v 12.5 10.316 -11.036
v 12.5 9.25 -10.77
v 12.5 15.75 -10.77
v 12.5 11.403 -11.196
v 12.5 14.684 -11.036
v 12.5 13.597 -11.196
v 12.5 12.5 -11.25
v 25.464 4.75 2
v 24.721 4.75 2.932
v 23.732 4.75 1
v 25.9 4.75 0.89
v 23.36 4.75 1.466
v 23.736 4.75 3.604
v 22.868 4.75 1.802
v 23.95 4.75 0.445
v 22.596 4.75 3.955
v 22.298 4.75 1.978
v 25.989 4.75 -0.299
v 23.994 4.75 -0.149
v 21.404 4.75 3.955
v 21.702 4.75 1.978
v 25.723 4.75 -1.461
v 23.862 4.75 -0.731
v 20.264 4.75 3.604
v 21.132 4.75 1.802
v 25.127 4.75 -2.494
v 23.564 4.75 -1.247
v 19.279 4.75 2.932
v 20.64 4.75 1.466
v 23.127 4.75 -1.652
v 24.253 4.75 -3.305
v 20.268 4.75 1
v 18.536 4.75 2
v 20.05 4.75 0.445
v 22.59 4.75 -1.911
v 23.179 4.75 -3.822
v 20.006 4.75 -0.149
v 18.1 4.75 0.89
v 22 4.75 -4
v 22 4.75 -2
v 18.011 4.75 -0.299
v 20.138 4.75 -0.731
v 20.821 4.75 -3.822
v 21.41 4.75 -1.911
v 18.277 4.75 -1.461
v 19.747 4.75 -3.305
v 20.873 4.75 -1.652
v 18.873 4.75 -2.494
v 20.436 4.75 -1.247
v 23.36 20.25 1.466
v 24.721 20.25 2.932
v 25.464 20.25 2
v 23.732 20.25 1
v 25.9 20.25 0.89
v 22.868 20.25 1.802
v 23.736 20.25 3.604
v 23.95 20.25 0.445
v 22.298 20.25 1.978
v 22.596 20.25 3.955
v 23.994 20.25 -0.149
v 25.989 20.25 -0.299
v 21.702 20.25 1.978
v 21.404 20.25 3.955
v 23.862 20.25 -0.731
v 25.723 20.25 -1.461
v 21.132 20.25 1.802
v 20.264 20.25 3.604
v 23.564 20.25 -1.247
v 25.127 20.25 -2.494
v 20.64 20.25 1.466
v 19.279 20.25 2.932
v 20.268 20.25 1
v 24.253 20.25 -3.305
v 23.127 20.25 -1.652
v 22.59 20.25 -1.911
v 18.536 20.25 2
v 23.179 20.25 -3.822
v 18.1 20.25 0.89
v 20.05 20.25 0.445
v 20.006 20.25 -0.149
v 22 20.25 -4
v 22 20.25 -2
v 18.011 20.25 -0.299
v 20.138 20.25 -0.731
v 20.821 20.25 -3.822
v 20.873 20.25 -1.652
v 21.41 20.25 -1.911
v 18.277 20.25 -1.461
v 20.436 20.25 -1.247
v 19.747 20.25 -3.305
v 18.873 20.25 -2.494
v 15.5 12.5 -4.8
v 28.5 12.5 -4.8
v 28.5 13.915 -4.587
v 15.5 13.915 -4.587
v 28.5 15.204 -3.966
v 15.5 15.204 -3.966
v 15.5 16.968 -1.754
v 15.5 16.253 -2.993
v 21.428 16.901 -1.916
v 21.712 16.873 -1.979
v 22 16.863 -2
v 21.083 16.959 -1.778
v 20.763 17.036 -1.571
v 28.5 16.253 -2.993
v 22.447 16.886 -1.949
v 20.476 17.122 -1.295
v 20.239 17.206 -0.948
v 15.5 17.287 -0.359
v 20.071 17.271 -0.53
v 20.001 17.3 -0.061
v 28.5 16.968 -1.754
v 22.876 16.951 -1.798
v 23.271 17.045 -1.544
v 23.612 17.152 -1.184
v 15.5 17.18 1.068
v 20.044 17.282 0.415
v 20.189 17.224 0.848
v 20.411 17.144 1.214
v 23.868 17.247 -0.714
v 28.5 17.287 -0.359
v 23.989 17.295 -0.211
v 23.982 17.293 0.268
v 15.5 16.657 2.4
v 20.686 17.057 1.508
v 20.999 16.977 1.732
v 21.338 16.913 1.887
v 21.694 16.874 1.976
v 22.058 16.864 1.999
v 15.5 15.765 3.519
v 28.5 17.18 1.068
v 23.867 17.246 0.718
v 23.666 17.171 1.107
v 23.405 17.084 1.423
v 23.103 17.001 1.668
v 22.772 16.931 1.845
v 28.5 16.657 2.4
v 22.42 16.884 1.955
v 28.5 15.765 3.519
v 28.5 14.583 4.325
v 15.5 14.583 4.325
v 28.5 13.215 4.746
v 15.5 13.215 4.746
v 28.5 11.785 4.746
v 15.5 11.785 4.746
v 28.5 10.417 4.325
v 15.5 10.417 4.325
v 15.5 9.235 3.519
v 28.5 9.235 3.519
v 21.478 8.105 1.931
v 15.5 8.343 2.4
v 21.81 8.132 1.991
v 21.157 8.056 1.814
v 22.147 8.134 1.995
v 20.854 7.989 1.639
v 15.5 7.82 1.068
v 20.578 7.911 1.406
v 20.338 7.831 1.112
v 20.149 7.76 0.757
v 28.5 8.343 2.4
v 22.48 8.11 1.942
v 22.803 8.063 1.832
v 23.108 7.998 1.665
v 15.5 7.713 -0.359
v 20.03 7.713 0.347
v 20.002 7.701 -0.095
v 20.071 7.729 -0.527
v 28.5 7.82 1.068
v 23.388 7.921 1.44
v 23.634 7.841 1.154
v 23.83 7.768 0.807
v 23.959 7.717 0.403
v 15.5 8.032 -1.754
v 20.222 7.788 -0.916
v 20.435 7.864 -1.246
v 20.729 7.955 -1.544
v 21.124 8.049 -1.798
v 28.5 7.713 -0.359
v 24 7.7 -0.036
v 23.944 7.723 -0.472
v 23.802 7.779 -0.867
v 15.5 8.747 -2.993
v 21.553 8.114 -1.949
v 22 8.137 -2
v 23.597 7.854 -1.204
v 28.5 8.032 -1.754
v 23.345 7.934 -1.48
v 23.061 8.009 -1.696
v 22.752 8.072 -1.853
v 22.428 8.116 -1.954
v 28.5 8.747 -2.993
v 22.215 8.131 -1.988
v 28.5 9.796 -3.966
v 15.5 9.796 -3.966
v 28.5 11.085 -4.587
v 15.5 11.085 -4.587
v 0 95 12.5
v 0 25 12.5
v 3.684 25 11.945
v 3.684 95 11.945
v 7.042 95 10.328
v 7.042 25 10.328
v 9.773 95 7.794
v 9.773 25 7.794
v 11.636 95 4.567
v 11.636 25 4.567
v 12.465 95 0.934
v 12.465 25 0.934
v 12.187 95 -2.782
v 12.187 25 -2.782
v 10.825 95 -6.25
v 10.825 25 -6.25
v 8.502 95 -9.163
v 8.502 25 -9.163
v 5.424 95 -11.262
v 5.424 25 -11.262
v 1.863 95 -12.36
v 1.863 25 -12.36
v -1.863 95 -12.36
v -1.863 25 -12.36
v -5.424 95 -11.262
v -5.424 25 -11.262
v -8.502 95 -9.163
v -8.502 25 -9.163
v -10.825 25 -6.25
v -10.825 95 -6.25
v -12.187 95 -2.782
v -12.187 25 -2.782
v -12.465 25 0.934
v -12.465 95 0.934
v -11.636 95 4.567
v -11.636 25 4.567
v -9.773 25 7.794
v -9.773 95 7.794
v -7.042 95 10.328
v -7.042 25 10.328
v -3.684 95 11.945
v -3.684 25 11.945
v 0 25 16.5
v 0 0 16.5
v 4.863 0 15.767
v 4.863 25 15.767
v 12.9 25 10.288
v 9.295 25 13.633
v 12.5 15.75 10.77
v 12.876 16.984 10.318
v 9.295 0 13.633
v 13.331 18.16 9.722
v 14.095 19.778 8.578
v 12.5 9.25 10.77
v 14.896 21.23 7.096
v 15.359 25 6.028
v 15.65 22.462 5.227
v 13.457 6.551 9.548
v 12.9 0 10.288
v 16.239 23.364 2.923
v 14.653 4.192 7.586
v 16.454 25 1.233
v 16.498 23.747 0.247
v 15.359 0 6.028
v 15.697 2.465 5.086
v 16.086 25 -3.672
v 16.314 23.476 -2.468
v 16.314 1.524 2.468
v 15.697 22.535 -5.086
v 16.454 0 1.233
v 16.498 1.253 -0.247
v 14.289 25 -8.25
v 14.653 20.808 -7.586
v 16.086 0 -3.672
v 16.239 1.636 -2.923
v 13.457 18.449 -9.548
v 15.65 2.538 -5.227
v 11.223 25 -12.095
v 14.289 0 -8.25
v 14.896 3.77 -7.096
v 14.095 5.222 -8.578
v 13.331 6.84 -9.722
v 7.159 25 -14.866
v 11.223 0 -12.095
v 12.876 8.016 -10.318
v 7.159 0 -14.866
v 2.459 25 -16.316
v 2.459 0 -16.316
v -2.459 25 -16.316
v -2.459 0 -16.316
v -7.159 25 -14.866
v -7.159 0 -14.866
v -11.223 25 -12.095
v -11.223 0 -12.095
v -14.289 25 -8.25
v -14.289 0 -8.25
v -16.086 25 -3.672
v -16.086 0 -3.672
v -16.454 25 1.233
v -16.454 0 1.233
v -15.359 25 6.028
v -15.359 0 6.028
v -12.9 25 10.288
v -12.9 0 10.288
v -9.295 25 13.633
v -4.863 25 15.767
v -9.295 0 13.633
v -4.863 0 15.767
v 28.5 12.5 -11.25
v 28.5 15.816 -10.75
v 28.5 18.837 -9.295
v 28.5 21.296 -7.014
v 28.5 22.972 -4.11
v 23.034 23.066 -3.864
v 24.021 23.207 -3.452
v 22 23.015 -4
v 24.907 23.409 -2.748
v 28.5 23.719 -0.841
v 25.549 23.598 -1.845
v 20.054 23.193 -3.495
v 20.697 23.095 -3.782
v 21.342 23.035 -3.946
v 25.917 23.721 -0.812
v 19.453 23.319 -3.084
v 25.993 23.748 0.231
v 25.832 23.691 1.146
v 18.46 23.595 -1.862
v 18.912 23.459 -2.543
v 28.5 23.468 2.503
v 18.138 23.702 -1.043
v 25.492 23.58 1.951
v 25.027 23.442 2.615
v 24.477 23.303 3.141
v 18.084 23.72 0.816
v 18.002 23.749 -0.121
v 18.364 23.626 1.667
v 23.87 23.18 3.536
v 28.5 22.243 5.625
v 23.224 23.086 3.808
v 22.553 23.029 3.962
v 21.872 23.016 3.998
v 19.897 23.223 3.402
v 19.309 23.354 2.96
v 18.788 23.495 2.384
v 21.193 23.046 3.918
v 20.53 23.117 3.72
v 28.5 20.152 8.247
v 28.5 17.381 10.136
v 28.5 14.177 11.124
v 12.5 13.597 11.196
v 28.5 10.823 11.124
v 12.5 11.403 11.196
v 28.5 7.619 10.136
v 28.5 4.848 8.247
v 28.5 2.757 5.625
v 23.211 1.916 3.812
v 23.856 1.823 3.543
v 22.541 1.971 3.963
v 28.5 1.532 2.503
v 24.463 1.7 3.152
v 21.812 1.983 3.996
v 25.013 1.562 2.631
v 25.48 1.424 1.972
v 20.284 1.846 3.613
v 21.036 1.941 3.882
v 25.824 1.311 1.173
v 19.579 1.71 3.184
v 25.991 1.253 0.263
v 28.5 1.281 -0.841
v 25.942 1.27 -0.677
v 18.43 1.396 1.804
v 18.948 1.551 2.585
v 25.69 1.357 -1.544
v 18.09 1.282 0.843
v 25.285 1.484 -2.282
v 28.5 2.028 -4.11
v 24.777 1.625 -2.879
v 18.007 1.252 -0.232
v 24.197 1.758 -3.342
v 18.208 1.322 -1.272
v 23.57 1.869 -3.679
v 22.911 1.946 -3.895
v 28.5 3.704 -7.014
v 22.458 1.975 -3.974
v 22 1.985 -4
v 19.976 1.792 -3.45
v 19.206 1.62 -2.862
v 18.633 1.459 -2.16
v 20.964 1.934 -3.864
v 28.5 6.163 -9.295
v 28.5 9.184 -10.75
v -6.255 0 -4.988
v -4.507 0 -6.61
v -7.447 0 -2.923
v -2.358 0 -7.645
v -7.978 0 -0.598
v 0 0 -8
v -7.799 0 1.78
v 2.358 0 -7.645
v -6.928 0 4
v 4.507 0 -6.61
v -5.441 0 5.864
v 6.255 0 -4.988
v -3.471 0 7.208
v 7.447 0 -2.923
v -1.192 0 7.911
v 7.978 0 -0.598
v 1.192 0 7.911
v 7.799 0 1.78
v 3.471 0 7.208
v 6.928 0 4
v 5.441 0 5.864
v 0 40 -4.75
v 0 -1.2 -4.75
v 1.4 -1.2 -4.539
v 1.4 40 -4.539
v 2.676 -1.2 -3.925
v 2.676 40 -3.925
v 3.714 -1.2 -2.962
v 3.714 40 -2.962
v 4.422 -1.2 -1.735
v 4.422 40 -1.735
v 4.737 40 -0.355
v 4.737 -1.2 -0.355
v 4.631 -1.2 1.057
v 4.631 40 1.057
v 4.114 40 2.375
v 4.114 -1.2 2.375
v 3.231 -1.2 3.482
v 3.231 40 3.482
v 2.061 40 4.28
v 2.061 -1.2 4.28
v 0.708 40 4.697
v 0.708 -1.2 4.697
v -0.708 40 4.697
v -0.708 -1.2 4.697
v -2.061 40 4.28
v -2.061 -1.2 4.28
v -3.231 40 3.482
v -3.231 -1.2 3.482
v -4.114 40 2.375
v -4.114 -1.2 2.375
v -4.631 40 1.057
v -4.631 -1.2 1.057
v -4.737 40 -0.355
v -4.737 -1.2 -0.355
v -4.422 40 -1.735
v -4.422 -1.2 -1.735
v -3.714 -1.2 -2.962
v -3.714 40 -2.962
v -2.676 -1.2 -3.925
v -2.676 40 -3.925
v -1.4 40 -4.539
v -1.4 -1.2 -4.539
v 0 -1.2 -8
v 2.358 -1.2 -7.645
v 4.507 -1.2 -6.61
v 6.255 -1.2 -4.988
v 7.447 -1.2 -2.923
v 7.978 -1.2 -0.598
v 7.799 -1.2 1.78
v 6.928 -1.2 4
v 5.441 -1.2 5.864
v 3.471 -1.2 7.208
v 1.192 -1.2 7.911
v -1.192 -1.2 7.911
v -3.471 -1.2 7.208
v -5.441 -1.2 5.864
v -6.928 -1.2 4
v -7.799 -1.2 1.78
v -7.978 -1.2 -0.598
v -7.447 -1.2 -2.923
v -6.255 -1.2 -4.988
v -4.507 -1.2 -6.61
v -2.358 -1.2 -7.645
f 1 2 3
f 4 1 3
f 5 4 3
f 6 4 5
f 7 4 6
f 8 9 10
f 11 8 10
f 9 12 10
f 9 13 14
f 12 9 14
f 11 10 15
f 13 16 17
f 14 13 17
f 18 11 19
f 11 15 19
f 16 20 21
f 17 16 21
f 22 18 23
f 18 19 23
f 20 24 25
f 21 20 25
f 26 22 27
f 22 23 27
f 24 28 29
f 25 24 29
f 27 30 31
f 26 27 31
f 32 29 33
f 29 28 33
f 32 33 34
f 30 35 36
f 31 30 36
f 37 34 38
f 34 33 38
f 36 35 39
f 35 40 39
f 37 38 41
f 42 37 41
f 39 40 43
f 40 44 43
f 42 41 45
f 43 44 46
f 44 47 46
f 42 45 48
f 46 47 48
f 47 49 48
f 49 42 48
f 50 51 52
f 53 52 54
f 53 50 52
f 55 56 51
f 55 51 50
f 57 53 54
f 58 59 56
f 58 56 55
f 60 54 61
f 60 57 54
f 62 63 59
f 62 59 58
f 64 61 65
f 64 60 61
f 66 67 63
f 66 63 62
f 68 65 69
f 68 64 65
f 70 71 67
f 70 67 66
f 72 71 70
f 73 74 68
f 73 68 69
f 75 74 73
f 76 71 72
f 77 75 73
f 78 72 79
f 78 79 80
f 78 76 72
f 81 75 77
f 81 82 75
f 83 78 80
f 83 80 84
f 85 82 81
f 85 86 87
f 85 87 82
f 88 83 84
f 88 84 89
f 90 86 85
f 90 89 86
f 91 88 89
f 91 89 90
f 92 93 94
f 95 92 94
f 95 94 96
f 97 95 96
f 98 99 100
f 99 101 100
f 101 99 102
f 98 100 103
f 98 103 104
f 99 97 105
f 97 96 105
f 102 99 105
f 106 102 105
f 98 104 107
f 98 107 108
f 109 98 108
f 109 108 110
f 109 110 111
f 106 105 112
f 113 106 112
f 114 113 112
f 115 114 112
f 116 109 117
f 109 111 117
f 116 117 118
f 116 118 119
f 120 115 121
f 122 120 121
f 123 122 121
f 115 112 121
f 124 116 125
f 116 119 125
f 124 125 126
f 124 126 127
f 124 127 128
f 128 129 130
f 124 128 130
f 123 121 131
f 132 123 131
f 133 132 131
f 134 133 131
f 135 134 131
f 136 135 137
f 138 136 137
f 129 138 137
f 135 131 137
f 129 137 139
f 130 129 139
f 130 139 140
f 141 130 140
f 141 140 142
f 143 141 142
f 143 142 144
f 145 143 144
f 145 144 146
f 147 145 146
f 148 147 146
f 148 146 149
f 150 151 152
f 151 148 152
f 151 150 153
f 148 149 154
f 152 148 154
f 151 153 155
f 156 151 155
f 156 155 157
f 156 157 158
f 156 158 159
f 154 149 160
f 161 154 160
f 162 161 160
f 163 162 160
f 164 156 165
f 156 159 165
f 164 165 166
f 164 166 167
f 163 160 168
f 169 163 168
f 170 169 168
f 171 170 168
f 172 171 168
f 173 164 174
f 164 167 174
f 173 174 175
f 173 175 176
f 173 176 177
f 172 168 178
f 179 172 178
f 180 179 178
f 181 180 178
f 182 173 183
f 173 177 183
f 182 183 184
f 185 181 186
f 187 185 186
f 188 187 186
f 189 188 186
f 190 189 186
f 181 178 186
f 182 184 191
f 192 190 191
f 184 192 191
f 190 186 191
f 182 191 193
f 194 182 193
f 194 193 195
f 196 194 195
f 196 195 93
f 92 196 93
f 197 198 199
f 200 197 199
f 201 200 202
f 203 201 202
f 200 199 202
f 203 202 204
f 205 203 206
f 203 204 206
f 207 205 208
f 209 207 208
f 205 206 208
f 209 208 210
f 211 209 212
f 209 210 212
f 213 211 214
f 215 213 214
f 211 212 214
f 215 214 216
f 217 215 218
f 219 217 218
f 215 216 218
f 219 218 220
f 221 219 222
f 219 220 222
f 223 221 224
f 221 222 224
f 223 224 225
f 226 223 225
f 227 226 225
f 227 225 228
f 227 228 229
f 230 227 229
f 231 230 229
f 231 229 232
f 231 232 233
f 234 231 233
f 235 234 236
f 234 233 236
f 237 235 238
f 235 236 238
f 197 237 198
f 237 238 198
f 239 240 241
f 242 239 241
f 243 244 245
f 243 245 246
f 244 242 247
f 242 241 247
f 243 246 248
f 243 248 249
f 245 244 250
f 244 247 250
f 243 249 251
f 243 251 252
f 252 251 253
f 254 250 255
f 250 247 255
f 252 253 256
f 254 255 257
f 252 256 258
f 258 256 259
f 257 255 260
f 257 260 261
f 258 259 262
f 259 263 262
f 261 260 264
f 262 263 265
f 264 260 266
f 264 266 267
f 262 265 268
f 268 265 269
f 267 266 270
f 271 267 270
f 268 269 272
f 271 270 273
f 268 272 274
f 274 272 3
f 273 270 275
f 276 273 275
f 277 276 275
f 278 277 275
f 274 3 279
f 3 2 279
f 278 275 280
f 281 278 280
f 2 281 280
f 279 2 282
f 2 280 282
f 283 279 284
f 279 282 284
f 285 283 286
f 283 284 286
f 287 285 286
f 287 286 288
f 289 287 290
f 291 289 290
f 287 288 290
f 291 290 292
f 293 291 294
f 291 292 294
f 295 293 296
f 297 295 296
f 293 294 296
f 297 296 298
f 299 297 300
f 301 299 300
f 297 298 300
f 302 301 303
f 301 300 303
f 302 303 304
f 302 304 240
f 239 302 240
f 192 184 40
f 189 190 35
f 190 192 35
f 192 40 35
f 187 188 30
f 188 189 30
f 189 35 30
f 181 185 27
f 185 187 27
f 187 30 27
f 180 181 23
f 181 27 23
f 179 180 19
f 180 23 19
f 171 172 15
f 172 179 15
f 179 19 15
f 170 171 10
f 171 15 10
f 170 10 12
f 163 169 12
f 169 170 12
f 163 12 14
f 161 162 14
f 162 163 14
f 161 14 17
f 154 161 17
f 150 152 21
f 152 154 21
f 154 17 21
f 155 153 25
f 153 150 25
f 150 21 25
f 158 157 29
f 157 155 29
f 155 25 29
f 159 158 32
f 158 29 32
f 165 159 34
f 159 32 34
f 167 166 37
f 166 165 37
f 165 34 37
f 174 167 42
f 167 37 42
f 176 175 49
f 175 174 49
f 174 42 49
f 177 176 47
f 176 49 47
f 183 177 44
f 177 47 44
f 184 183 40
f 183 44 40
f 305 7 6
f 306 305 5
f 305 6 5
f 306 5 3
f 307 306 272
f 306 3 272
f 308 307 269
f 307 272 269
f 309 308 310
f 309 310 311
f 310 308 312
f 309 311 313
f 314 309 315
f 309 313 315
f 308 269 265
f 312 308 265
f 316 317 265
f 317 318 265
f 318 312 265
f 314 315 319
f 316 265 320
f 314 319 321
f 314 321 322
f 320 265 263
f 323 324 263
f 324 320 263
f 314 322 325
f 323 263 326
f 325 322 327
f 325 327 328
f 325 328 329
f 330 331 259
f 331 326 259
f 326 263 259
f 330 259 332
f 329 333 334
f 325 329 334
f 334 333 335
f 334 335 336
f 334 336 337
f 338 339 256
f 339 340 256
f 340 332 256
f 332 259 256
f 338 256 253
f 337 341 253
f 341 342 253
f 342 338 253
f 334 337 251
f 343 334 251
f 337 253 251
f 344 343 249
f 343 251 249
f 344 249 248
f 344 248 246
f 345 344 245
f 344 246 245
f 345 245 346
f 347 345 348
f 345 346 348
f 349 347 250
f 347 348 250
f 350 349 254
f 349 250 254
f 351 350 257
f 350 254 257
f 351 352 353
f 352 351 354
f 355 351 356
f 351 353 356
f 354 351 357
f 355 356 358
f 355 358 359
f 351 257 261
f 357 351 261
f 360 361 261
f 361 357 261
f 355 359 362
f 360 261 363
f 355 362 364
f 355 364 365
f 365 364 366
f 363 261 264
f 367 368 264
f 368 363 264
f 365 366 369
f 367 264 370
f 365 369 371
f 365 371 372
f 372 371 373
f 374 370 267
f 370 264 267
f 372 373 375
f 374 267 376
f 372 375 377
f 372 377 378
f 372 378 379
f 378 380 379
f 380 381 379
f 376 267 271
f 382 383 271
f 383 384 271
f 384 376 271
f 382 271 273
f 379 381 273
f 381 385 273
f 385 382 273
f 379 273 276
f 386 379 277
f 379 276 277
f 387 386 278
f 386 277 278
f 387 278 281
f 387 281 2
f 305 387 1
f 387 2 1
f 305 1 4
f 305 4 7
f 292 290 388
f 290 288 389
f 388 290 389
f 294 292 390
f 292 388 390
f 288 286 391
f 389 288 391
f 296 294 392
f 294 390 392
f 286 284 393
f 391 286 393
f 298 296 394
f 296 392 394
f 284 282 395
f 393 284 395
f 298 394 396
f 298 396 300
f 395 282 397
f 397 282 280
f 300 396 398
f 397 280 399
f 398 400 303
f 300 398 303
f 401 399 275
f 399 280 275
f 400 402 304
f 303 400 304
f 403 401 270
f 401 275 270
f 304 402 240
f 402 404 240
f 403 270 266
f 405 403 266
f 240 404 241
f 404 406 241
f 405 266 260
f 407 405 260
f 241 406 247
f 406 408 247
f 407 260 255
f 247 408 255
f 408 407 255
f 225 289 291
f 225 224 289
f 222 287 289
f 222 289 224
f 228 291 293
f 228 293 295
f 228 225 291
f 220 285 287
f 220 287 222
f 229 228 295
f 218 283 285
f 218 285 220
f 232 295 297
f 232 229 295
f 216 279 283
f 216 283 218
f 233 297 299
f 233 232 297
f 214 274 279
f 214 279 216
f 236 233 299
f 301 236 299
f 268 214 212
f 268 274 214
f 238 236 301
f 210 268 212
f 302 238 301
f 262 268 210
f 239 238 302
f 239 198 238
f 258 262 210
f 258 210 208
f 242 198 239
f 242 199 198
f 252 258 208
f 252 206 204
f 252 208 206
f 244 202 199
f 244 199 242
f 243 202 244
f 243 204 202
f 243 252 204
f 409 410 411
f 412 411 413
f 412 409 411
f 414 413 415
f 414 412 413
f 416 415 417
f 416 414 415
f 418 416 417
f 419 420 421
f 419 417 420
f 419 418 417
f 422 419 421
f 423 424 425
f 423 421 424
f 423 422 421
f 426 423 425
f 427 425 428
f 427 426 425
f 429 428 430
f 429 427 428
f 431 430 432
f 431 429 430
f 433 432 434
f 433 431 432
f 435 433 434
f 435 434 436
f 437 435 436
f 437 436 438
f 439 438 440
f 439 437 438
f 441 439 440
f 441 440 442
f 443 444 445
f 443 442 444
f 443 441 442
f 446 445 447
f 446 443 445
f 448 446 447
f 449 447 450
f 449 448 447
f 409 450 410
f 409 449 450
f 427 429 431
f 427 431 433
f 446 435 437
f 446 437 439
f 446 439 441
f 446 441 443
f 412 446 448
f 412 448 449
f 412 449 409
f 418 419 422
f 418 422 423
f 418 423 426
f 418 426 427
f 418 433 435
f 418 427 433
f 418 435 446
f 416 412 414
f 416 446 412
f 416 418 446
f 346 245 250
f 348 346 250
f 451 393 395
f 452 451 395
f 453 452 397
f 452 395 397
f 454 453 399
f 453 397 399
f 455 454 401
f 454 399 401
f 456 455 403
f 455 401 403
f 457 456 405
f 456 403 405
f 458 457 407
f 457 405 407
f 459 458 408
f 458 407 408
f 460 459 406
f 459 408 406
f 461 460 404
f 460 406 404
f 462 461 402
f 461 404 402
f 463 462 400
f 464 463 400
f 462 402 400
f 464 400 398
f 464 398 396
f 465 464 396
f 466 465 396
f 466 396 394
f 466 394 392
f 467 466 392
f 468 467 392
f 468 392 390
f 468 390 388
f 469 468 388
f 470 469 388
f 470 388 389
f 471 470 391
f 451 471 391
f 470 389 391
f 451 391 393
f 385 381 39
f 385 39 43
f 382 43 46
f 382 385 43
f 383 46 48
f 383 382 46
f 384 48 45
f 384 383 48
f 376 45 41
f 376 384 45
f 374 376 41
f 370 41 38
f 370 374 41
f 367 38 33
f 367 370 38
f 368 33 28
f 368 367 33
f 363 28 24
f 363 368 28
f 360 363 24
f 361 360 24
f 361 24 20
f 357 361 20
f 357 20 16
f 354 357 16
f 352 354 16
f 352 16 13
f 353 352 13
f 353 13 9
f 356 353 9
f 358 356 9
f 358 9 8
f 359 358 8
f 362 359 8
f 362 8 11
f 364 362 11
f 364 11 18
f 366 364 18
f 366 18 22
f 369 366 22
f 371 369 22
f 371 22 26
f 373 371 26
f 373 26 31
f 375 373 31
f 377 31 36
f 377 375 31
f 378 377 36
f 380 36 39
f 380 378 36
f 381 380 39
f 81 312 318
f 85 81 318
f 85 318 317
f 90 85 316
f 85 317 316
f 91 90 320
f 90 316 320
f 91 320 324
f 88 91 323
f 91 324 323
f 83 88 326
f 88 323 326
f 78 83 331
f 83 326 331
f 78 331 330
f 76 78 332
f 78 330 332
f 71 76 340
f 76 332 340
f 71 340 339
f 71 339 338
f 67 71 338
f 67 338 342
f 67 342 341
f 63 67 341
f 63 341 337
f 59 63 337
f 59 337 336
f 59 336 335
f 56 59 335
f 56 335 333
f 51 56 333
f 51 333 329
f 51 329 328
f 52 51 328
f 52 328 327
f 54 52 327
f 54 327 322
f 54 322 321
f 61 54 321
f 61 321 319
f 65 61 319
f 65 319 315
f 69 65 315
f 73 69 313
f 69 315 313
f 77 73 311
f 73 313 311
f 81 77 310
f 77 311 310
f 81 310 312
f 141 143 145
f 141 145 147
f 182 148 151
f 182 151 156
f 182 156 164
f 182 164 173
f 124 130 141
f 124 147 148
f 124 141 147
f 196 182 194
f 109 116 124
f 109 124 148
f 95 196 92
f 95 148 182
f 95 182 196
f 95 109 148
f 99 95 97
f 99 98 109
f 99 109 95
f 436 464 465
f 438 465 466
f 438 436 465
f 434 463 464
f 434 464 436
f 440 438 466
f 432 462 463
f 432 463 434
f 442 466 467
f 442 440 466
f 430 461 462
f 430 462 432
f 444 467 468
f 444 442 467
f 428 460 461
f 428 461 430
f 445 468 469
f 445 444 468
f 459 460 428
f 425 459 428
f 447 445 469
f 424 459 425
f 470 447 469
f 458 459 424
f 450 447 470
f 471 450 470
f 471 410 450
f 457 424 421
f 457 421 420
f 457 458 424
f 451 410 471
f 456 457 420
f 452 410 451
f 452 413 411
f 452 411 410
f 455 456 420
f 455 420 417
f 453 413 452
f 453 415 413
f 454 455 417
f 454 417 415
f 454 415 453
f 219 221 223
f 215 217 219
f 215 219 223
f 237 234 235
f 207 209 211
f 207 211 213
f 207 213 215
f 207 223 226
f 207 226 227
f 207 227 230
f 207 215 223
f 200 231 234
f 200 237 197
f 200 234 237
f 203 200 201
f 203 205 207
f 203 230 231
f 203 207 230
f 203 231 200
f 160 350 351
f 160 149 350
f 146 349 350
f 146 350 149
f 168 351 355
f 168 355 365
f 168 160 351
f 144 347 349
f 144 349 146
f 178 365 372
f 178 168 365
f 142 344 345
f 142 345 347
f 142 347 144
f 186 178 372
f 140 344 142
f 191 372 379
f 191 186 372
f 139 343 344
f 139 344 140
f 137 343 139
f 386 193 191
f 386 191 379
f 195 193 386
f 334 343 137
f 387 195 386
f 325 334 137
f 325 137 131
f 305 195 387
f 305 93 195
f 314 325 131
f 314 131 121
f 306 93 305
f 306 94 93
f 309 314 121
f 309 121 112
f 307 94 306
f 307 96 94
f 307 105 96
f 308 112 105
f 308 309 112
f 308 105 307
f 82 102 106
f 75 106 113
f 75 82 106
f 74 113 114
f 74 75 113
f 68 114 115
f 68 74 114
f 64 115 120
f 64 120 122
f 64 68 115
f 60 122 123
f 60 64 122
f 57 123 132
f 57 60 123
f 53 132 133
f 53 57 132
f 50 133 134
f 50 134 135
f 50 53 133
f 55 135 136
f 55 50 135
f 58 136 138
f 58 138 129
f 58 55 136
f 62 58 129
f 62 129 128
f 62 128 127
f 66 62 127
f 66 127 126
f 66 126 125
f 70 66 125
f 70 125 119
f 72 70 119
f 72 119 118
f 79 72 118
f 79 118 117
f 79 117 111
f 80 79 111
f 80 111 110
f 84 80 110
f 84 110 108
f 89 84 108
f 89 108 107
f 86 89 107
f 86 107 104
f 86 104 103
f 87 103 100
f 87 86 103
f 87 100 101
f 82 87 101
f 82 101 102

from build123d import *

# Parameters (mm, degrees)
ESQUISSE1_R                         = 16.5
BOSS_EXTRU_1_DEPTH                  = 25
BOSS_EXTRU_4_DEPTH                  = 12
BOSS_EXTRU_4_DEPTH_BACK             = 4
ESQUISSE9_R                         = 11.25
ESQUISSE10_R                        = 4.8
ENL_V_MAT_EXTRU_3_DEPTH             = 13
ESQUISSE11_R                        = 4
ENL_V_MAT_EXTRU_4_DEPTH             = 3.5
ENL_V_MAT_EXTRU_5_REACH             = 40.66
ENL_V_MAT_EXTRU_5_END_RADIUS        = 4.8
ESQUISSE12_R                        = 2
ESQUISSE13_R                        = 12.5
BOSS_EXTRU_5_DEPTH                  = 70
ESQUISSE15_R                        = 8
BOSS_EXTRU_6_DEPTH                  = 1.2
ESQUISSE2_R                         = 4.75
ENL_V_MAT_EXTRU_6_DEPTH             = 40
ENL_V_MAT_EXTRU_6_DIRECTION_2_REACH = 102.546


with BuildPart() as part:
    # Esquisse1 → Boss.-Extru.1 (new body)
    with BuildSketch(Plane(origin=(0, 0, 0), x_dir=(1, 0, 0), z_dir=(0, 1, 0))):
        with Locations(Location((0, 0, 0), (0, 0, 270))):
            Circle(ESQUISSE1_R)
    extrude(amount=BOSS_EXTRU_1_DEPTH)

    # Esquisse9 → Boss.-Extru.4 (add, two sides: drawn at the far end of the back side and taken through both)
    with BuildSketch(Plane(origin=(16.5, 0, 0), x_dir=(0, 0, -1), z_dir=(1, 0, 0)).offset(-BOSS_EXTRU_4_DEPTH_BACK)):
        with Locations((0, 12.5)):
            Circle(ESQUISSE9_R)
    extrude(amount=BOSS_EXTRU_4_DEPTH + BOSS_EXTRU_4_DEPTH_BACK)

    # Esquisse10 → Enlèv. mat.-Extru.3 (cut)
    with BuildSketch(Plane(origin=(28.5, 0, 0), x_dir=(0, 0, -1), z_dir=(1, 0, 0))):
        with Locations((0, 12.5)):
            Circle(ESQUISSE10_R)
    extrude(amount=-ENL_V_MAT_EXTRU_3_DEPTH, mode=Mode.SUBTRACT)

    # Esquisse11 → Enlèv. mat.-Extru.4 (cut)
    with BuildSketch(Plane(origin=(0, 1.25, 0), x_dir=(1, 0, 0), z_dir=(0, 1, 0))):
        with Locations(Location((22, 0, 0), (0, 0, 90))):
            Circle(ESQUISSE11_R)
    enl_v_mat_extru_4 = extrude(amount=ENL_V_MAT_EXTRU_4_DEPTH, mode=Mode.SUBTRACT)

    # Enlèv. mat.-Extru.5: up to this cylinder (the profile starts outside it)
    enl_v_mat_extru_5_end = Plane(origin=(22, 12.5, 0), z_dir=(1, 0, 0)) * Cylinder(ENL_V_MAT_EXTRU_5_END_RADIUS, 91.92, mode=Mode.PRIVATE)
    # Esquisse12 → Enlèv. mat.-Extru.5 (cut, up to the surface)
    with BuildSketch(Plane.XZ.offset(-4.75), mode=Mode.PRIVATE) as enl_v_mat_extru_5_sk1:
        with Locations(Location((22, 0, 0), (0, 0, 270))):
            Circle(ESQUISSE12_R)
    enl_v_mat_extru_5_tool1 = extrude(enl_v_mat_extru_5_sk1.sketch, amount=-ENL_V_MAT_EXTRU_5_REACH, mode=Mode.PRIVATE) - enl_v_mat_extru_5_end
    enl_v_mat_extru_5 = enl_v_mat_extru_5_tool1.solids().sort_by_distance((22, 4.75, 0))[0]
    add(enl_v_mat_extru_5, mode=Mode.SUBTRACT)

    # Symétrie1: Enlèv. mat.-Extru.4, Enlèv. mat.-Extru.5 across plane
    add(enl_v_mat_extru_4.mirror(Plane.XY), mode=Mode.SUBTRACT)
    add(enl_v_mat_extru_5.mirror(Plane.XY), mode=Mode.SUBTRACT)

    # Symétrie1 at the second plane: Enlèv. mat.-Extru.4, Enlèv. mat.-Extru.5 across plane
    add(enl_v_mat_extru_4.mirror(Plane.ZX.offset(12.5)), mode=Mode.SUBTRACT)
    add(enl_v_mat_extru_5.mirror(Plane.ZX.offset(12.5)), mode=Mode.SUBTRACT)

    # Esquisse13 → Boss.-Extru.5 (add)
    with BuildSketch(Plane(origin=(0, 25, 0), x_dir=(1, 0, 0), z_dir=(0, 1, 0))):
        with Locations(Location((0, 0, 0), (0, 0, 270))):
            Circle(ESQUISSE13_R)
    extrude(amount=BOSS_EXTRU_5_DEPTH)

    # Esquisse15 → Boss.-Extru.6 (add)
    with BuildSketch(Plane.XZ):
        with Locations(Location((0, 0, 0), (0, 0, 270))):
            Circle(ESQUISSE15_R)
    extrude(amount=BOSS_EXTRU_6_DEPTH)

    # Esquisse2 → Enlèv. mat.-Extru.6 (cut)
    with BuildSketch(Plane.XZ):
        with Locations(Location((0, 0, 0), (0, 0, 270))):
            Circle(ESQUISSE2_R)
    extrude(amount=-ENL_V_MAT_EXTRU_6_DEPTH, mode=Mode.SUBTRACT)

    # Esquisse2 → Enlèv. mat.-Extru.6 direction 2 (cut, up to next)
    with BuildSketch(Plane.XZ, mode=Mode.PRIVATE) as enl_v_mat_extru_6_direction_2_sk1:
        with Locations(Location((0, 0, 0), (0, 0, 270))):
            Circle(ESQUISSE2_R)
    enl_v_mat_extru_6_direction_2_tool1 = extrude(enl_v_mat_extru_6_direction_2_sk1.sketch, amount=ENL_V_MAT_EXTRU_6_DIRECTION_2_REACH, mode=Mode.PRIVATE) & part.part
    add(enl_v_mat_extru_6_direction_2_tool1.solids().sort_by_distance((0, 0, 0))[0], mode=Mode.SUBTRACT)


solid = part.part
